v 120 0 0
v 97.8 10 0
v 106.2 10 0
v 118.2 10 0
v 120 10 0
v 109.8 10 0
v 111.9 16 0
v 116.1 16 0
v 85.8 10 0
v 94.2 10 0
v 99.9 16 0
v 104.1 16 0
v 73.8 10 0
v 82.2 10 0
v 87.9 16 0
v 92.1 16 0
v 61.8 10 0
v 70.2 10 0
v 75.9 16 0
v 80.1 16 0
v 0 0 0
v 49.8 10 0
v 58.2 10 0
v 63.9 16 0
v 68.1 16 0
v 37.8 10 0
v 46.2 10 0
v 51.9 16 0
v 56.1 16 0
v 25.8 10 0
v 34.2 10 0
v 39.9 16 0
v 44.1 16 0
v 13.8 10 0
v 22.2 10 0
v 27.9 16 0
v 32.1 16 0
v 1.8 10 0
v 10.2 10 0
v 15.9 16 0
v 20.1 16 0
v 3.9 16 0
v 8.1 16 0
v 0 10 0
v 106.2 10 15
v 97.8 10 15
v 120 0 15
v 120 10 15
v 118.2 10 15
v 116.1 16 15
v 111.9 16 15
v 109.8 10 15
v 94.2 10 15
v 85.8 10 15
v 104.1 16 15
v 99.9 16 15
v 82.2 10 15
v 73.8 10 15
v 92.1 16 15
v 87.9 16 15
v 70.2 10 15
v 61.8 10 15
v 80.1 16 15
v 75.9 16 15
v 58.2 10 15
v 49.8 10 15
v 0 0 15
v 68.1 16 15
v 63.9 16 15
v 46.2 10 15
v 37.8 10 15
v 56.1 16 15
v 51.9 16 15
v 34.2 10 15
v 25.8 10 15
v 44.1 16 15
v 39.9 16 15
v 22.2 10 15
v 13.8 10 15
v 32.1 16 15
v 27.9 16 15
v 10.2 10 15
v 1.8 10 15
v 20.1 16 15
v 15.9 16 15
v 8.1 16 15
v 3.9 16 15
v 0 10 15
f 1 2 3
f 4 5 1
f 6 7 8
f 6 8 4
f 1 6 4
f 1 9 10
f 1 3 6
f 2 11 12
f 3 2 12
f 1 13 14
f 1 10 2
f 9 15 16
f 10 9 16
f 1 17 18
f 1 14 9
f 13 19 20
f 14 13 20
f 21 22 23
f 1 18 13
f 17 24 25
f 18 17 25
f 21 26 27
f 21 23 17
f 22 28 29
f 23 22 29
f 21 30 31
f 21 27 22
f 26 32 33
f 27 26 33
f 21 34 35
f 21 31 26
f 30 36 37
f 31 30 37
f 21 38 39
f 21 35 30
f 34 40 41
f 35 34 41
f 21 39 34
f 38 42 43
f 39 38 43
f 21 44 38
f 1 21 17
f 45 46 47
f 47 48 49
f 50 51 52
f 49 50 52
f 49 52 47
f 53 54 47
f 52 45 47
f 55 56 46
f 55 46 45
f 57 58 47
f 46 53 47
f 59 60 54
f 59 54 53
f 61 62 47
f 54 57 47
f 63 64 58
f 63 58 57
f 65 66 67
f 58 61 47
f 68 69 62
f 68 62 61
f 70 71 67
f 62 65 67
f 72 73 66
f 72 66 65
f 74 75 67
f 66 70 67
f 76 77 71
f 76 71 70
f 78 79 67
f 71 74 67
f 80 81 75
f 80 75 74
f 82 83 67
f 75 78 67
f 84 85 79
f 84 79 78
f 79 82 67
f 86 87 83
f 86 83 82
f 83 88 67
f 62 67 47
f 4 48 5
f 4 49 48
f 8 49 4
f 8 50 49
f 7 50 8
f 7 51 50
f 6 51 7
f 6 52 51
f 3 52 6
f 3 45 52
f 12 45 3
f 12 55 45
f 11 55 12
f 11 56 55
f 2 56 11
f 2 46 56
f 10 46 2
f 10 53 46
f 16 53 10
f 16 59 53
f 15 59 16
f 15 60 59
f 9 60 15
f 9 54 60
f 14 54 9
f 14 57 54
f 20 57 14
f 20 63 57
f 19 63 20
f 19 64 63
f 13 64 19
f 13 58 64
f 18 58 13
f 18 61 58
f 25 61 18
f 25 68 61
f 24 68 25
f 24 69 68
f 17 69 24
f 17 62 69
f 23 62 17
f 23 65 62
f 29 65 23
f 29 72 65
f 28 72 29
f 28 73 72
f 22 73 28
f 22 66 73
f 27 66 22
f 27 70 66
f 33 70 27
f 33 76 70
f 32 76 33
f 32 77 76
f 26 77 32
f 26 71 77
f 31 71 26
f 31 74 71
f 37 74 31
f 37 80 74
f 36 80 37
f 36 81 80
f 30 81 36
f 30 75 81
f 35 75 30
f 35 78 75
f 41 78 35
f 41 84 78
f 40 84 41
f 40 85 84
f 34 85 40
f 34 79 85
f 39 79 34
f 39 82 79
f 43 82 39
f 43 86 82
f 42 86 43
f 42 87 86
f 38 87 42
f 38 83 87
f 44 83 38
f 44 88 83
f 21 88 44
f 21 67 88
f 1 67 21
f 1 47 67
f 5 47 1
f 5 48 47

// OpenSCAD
$fn = 32;

// ----------------------------------------------------------------------
// Gear rack: 10 teeth, pitch 12 mm
// ----------------------------------------------------------------------

// --- parameters (mm) ---
teeth = 10;               // number of teeth
pitch = 12;               // tooth pitch, X
root_w = 8.4;             // tooth width at the root
tip_w = 4.2;              // tooth width at the tip
base_h = 10;              // rack body height, Y
tooth_h = 6;              // tooth height above the body
plate_t = 15;             // rack width, Z (extrusion height)

rack_l = teeth * pitch;  // overall length
total_h = base_h + tooth_h;  // overall height

profile = [[0, 0], [120, 0], [120, 10], [118.2, 10], [116.1, 16], [111.9, 16], [109.8, 10], [106.2, 10], [104.1, 16], [99.9, 16], [97.8, 10], [94.2, 10], [92.1, 16], [87.9, 16], [85.8, 10], [82.2, 10], [80.1, 16], [75.9, 16], [73.8, 10], [70.2, 10], [68.1, 16], [63.9, 16], [61.8, 10], [58.2, 10], [56.1, 16], [51.9, 16], [49.8, 10], [46.2, 10], [44.1, 16], [39.9, 16], [37.8, 10], [34.2, 10], [32.1, 16], [27.9, 16], [25.8, 10], [22.2, 10], [20.1, 16], [15.9, 16], [13.8, 10], [10.2, 10], [8.1, 16], [3.9, 16], [1.8, 10], [0, 10]];  // primary outline, 44 points, counter clockwise

// --- the one profile operation ---
linear_extrude(height = plate_t) polygon(points = profile);
